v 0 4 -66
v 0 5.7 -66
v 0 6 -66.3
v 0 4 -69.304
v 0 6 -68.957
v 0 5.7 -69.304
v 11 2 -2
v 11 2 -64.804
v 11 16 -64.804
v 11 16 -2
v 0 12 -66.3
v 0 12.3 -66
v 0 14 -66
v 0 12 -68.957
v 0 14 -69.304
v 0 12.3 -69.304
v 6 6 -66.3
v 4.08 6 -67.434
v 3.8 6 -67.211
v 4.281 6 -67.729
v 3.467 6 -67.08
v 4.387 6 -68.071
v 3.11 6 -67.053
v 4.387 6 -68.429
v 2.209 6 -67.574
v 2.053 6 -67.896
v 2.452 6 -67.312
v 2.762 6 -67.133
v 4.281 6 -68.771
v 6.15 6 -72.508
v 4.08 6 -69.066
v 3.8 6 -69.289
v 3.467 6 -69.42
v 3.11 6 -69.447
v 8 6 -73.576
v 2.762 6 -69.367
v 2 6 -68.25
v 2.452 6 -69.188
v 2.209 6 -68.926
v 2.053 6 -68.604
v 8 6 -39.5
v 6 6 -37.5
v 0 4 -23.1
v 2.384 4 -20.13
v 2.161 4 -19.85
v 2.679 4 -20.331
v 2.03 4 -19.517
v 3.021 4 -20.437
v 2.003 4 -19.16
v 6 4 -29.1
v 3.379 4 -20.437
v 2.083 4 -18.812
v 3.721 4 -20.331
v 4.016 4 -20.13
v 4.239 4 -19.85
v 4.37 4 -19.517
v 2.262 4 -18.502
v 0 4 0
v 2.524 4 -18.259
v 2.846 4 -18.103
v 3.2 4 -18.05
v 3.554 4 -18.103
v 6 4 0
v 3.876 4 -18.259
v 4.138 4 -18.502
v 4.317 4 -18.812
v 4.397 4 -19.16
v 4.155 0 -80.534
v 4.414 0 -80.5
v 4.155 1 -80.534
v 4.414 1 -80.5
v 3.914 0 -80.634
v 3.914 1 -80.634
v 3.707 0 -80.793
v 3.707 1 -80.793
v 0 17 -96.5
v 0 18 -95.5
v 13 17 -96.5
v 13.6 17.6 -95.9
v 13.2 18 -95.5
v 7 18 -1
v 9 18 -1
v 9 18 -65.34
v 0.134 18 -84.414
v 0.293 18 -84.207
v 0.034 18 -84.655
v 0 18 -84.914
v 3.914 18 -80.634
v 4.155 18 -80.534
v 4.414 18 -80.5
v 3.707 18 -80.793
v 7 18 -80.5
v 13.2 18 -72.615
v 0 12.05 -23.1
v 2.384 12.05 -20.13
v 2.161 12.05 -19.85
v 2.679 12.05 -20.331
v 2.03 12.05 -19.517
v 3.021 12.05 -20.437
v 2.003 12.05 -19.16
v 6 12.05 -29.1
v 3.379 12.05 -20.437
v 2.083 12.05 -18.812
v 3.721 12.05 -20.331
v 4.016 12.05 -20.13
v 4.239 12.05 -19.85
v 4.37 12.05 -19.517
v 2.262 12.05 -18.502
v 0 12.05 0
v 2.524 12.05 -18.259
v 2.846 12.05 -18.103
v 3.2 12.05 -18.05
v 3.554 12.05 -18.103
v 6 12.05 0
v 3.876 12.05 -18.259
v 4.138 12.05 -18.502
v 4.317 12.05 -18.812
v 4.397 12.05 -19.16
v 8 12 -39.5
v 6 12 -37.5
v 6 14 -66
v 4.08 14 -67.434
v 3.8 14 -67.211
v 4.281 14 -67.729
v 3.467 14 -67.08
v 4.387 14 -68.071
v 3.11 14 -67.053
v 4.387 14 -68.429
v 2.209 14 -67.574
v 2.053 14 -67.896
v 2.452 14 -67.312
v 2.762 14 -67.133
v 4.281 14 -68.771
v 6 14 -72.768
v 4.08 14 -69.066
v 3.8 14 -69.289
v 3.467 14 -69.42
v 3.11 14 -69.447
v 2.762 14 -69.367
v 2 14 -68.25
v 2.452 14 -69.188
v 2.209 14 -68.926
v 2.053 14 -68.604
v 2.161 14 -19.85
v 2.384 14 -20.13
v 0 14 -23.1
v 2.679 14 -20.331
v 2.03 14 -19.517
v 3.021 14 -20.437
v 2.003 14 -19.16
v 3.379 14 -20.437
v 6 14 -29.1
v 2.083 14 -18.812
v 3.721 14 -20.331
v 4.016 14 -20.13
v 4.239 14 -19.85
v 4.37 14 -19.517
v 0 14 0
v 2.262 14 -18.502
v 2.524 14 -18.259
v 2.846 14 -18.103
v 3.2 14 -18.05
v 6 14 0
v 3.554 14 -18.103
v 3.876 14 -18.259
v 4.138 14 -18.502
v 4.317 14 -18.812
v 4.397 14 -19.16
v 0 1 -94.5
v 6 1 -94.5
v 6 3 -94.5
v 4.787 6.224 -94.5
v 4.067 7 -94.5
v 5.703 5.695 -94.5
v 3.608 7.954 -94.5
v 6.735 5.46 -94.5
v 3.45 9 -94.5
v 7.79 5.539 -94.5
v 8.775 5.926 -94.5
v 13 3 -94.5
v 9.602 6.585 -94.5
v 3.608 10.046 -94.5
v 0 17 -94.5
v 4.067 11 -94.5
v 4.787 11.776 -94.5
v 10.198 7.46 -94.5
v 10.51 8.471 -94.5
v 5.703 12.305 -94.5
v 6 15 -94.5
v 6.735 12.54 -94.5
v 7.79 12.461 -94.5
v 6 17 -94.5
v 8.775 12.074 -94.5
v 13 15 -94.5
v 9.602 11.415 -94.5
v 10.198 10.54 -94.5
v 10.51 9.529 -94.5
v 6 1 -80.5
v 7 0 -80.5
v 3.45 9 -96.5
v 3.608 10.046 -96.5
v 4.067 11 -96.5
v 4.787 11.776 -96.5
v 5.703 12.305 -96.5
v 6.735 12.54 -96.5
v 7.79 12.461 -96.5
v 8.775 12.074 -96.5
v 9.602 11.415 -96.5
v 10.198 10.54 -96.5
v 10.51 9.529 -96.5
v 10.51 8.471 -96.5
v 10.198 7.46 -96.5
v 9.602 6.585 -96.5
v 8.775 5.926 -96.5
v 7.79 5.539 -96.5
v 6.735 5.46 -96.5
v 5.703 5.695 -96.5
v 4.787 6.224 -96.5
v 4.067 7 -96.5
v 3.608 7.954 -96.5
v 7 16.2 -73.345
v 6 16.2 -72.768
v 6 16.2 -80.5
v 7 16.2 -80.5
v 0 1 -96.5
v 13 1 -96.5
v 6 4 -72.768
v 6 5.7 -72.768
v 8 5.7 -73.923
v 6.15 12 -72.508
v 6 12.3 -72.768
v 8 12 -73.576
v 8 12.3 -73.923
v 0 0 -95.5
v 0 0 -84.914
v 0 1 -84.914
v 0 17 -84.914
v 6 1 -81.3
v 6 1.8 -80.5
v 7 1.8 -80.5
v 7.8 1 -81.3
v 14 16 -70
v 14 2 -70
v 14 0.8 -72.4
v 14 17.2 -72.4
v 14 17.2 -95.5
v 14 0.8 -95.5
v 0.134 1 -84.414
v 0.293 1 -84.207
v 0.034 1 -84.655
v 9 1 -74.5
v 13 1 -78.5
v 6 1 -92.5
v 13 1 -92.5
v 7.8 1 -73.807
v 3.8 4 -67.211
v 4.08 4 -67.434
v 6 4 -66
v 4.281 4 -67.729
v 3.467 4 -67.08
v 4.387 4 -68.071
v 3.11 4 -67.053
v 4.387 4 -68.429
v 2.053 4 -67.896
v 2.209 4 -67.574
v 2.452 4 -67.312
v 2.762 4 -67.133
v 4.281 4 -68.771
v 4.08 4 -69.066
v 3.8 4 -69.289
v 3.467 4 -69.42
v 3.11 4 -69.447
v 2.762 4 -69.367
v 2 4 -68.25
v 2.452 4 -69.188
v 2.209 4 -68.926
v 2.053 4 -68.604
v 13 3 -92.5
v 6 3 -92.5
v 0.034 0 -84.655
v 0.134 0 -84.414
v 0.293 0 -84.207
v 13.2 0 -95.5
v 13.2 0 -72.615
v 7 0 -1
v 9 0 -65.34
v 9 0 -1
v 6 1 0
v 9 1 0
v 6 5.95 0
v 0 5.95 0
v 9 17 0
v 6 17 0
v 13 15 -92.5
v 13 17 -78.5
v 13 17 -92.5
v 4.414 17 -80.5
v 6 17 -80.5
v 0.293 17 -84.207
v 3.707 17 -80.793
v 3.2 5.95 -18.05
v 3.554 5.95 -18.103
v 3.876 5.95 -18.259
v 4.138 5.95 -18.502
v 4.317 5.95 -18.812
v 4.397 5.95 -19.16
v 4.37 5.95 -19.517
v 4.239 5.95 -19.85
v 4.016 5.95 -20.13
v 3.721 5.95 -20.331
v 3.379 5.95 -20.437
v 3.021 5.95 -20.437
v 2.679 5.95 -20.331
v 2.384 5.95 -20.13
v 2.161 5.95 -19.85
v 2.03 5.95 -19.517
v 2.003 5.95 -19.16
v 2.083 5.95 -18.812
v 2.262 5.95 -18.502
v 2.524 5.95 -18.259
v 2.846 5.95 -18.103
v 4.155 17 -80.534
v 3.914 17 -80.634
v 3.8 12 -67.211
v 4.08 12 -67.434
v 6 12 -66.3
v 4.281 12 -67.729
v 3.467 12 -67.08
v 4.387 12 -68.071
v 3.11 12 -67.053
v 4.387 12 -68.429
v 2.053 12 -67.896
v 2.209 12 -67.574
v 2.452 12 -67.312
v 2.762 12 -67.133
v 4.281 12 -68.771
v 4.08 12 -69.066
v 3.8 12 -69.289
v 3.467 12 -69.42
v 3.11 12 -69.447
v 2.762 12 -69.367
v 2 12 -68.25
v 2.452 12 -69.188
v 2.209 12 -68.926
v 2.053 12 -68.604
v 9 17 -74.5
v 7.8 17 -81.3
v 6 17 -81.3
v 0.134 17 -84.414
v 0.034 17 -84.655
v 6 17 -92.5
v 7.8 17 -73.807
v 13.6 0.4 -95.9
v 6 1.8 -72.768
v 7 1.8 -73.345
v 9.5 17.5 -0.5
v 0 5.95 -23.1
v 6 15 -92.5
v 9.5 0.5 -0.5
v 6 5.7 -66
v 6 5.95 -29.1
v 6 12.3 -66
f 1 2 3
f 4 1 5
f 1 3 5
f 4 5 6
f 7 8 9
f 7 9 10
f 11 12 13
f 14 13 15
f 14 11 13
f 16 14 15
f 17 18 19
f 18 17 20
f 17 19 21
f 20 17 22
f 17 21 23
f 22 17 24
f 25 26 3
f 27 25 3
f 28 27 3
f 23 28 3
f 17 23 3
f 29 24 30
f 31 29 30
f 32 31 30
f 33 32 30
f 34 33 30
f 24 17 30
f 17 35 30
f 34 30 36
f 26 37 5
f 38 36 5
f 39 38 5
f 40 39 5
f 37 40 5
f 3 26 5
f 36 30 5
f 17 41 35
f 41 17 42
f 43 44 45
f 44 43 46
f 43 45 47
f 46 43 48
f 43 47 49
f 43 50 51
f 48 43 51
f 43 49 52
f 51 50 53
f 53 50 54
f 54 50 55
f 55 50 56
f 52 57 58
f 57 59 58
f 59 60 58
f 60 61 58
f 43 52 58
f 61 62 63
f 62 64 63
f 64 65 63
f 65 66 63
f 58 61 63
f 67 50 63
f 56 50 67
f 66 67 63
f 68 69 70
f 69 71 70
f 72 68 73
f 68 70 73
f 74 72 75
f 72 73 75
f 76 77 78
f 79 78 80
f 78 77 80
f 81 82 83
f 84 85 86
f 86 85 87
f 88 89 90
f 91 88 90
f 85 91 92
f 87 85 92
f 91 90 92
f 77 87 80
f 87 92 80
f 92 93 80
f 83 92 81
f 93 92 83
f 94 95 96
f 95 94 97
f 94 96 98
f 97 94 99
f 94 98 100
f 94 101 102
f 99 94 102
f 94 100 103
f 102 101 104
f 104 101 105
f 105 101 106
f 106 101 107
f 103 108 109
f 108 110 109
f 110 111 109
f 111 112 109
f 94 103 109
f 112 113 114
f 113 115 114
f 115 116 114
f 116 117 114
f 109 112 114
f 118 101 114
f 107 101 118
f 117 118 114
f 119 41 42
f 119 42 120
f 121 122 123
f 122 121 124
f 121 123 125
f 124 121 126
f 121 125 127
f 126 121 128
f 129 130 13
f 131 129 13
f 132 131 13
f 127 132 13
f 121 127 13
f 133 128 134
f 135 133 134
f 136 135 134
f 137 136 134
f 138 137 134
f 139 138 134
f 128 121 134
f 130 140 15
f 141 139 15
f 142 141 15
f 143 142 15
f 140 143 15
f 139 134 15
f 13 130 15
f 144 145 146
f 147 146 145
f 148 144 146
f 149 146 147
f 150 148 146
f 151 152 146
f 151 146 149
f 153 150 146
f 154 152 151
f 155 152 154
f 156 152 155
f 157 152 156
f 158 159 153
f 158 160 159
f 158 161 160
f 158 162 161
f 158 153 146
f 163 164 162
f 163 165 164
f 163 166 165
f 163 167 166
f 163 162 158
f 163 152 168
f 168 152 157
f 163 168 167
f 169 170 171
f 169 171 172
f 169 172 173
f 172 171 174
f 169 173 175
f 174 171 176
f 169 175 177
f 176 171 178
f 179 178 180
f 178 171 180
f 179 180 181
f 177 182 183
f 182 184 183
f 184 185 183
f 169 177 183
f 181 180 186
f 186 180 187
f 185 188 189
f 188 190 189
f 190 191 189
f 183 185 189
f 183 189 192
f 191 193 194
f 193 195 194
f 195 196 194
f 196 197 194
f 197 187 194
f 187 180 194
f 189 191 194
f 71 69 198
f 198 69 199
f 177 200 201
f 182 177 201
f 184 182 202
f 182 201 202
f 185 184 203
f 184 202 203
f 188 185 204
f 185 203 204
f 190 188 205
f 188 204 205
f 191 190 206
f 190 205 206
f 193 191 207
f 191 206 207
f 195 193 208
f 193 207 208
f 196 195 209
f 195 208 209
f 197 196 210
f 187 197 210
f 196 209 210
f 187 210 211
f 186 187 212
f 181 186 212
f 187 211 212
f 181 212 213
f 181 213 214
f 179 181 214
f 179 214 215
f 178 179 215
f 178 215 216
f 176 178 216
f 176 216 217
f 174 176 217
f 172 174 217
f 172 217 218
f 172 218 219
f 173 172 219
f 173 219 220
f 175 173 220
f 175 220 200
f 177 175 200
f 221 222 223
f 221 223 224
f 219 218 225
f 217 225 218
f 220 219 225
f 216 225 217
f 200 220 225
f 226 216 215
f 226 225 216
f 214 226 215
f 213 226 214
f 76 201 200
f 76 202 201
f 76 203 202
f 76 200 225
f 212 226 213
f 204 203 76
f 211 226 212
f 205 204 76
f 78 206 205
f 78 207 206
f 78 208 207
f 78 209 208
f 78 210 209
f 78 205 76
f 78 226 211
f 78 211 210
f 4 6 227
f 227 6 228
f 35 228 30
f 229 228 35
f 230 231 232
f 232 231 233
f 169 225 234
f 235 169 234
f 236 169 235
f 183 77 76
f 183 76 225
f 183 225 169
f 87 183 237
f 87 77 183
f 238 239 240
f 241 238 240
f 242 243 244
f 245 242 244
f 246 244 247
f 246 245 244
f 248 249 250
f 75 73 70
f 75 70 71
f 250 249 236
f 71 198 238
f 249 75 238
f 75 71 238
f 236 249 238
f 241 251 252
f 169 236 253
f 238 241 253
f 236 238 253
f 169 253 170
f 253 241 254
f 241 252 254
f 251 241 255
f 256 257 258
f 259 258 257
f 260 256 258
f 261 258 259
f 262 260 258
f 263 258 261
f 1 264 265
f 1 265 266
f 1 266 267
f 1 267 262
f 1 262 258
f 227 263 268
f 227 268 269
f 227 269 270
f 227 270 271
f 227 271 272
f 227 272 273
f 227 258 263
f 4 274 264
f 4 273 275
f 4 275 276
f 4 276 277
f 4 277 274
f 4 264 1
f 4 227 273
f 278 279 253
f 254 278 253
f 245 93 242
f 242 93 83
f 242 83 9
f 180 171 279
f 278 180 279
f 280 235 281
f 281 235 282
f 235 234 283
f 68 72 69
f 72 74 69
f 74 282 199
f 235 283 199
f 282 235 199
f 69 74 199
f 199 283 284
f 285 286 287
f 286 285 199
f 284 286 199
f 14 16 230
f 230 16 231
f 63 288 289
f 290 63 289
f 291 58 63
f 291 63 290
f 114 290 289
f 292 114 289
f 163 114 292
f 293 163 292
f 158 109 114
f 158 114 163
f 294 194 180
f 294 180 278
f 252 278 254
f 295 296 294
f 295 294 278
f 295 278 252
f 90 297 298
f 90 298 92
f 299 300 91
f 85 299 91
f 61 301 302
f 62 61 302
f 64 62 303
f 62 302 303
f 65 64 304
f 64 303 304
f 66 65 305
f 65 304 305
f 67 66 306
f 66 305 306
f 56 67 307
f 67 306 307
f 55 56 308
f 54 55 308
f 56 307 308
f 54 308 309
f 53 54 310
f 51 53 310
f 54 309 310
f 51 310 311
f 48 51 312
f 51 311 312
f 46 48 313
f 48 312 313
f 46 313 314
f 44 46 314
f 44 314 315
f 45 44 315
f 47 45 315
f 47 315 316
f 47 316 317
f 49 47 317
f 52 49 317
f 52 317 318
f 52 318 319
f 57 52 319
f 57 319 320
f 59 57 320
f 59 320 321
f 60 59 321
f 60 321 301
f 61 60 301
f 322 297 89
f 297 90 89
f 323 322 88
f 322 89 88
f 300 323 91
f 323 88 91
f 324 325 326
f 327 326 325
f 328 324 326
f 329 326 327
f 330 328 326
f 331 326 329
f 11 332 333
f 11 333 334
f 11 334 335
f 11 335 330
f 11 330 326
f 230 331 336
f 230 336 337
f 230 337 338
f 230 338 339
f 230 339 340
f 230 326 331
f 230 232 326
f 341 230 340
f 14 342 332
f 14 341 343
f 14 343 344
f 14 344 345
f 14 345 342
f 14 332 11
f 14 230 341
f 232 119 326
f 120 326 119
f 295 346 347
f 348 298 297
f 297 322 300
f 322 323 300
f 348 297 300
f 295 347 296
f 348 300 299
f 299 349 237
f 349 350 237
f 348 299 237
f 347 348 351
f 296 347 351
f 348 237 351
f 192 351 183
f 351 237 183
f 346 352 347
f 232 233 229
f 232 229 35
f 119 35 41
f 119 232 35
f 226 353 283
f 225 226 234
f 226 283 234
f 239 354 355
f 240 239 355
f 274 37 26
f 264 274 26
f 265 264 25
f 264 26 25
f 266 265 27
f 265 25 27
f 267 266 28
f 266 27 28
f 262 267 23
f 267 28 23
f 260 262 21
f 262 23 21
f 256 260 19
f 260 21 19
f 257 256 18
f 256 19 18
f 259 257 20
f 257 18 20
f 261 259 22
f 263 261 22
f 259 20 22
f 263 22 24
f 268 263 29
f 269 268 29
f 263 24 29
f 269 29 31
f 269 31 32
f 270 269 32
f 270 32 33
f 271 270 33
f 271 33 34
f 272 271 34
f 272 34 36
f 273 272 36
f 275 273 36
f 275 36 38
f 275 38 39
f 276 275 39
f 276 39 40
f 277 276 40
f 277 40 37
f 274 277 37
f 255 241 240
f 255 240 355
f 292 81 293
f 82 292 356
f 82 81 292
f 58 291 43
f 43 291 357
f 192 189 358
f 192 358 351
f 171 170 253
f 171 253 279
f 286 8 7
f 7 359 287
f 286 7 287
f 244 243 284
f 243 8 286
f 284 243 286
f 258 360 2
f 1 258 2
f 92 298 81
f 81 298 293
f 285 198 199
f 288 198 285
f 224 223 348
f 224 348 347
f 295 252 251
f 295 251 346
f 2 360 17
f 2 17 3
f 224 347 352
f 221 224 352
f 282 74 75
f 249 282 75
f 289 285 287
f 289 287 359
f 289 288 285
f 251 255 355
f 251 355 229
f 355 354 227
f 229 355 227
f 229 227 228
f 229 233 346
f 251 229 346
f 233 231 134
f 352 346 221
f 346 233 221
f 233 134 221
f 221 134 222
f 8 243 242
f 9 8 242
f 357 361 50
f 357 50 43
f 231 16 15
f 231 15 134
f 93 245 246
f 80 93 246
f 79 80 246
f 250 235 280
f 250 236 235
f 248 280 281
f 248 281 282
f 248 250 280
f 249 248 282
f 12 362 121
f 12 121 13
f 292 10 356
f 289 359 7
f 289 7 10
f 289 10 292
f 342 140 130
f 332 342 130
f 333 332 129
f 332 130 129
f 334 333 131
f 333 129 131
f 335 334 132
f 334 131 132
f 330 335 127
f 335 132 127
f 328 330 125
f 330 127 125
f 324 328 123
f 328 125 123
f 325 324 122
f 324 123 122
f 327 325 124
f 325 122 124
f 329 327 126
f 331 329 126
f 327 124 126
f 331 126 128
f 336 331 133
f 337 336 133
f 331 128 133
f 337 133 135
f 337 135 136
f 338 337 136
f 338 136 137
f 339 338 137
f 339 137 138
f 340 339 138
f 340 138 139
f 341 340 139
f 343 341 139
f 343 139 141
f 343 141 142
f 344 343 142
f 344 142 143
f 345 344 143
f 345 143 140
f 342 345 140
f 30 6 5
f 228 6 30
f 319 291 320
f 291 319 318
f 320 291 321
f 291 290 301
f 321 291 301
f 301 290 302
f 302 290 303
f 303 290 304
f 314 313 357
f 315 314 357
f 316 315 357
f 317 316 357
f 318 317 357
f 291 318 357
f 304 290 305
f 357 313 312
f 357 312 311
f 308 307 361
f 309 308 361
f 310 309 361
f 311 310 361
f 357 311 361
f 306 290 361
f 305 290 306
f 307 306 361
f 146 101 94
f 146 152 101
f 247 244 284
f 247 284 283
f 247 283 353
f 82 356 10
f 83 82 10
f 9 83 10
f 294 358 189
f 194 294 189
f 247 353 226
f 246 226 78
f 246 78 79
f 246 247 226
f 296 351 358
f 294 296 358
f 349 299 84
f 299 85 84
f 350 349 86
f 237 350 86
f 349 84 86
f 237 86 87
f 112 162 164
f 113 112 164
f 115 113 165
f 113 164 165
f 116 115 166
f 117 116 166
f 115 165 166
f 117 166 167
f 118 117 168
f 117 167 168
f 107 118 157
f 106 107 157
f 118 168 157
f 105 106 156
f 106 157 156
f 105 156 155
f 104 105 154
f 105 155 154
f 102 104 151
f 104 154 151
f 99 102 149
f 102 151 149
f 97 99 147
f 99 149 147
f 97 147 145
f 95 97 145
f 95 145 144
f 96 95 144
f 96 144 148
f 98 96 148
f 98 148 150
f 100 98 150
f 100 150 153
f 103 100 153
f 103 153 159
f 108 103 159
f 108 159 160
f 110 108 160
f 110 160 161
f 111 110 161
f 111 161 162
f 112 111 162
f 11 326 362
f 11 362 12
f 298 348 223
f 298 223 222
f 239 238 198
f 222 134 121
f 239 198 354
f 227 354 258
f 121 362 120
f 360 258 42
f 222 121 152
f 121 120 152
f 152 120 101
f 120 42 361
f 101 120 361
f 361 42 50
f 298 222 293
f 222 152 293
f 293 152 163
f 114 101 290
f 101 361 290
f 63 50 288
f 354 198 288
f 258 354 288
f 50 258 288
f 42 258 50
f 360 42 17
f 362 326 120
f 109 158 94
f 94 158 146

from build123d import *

# Parameters (mm, degrees)
SKETCH_2_W           = 96.5
SKETCH_2_H           = 18
EXTRUDE_1_DEPTH      = 14
SKETCH_6_W           = 6
SKETCH_6_H           = 4
CUT_EXTRUDE_3_DEPTH  = 100.157702676
CUT_EXTRUDE_START    = -4
SKETCH_6_4_W         = 6
SKETCH_6_4_H         = 6.1
CUT_EXTRUDE_5_DEPTH  = 96.157702676
SKETCH_7_W           = 73.4
SKETCH_7_H           = 10
CUT_EXTRUDE_4_DEPTH  = 6
SKETCH_8_R           = 1.2
CUT_EXTRUDE_6_DEPTH  = 99.510151761
SKETCH_10_W          = 2
SKETCH_10_H          = 18
EXTRUDE_3_DEPTH      = 6
CUT_EXTRUDE_7_DEPTH  = 7
CHAMFER_4_SIZE       = 1
SKETCH_12_R          = 3.55
CUT_EXTRUDE_8_DEPTH  = 5
CHAMFER_6_SIZE       = 0.8
CHAMFER_7_SIZE       = 1
EXTRUDE_4_REACH      = 106.158
EXTRUDE_START        = -5
SKETCH_13_W          = 14
SKETCH_13_H          = 1
CHAMFER_8_SIZE       = 6
CHAMFER_9_SIZE       = 4
CHAMFER_10_SIZE      = 3
CHAMFER_10_SIZE2     = 1.732050808
SKETCH_14_W          = 35
SKETCH_14_H          = 6
CUT_EXTRUDE_9_DEPTH  = 2
CHAMFER_11_SIZE      = 4
SKETCH_15_W          = 3
SKETCH_15_H          = 70
CUT_EXTRUDE_10_DEPTH = 100.157702676
CHAMFER_12_SIZE2     = 3
CHAMFER_12_SIZE      = 5.196152423
CHAMFER_14_SIZE      = 2
SKETCH_16_W          = 1
SKETCH_16_H          = 12
EXTRUDE_5_DEPTH      = 0.8
EXTRUDE_START_2      = 16
SKETCH_16_2_W        = 1
SKETCH_16_2_H        = 12
EXTRUDE_6_DEPTH      = 0.8
CHAMFER_15_SIZE      = 0.8
FILLET_1_R           = 1
EXTRUDE_7_DEPTH      = 2
EXTRUDE_START_3      = 6
EXTRUDE_8_DEPTH      = 2
SKETCH_18_R          = 1.2
CUT_EXTRUDE_11_DEPTH = 99.510151761
CHAMFER_16_SIZE      = 0.3


# Some blends are built 0.0001 mm under size
with BuildPart() as part:
    # 草图2 → 凸台-拉伸1 (new body)
    with BuildSketch(Plane(origin=(0, 0, 0), x_dir=(0, 0, -1), z_dir=(1, 0, 0))):
        with Locations((48.25, 9)):
            Rectangle(SKETCH_2_W, SKETCH_2_H)
    extrude(amount=EXTRUDE_1_DEPTH)

    # 草图6 → 切除-拉伸3 (cut, through all)
    with BuildSketch(Plane(origin=(0, 0, -96.5), x_dir=(-1, 0, 0), z_dir=(0, 0, -1))):
        with Locations((-3, 16)):
            Rectangle(SKETCH_6_W, SKETCH_6_H)
        with Locations((-3, 2)):
            Rectangle(SKETCH_6_W, SKETCH_6_H)
    extrude(amount=-CUT_EXTRUDE_3_DEPTH, mode=Mode.SUBTRACT)

    # 草图6<4> → 切除-拉伸5 (cut, through all)
    with BuildSketch(Plane(origin=(0, 0, -96.5), x_dir=(-1, 0, 0), z_dir=(0, 0, -1)).offset(CUT_EXTRUDE_START)):
        with Locations((-3, 9)):
            Rectangle(SKETCH_6_4_W, SKETCH_6_4_H)
    extrude(amount=-CUT_EXTRUDE_5_DEPTH, mode=Mode.SUBTRACT)

    # 草图7 → 切除-拉伸4 (cut)
    with BuildSketch(Plane.ZY):
        with Locations((-59.8, 9)):
            Rectangle(SKETCH_7_W, SKETCH_7_H)
    extrude(amount=-CUT_EXTRUDE_4_DEPTH, mode=Mode.SUBTRACT)

    # 草图8 → 切除-拉伸6 (cut, through all)
    with BuildSketch(Plane(origin=(0, 14, 0), x_dir=(1, 0, 0), z_dir=(0, 1, 0))):
        with Locations(Location((3.2, 19.25, 0), (0, 0, 270))):
            Circle(SKETCH_8_R)
    extrude(amount=-CUT_EXTRUDE_6_DEPTH, mode=Mode.SUBTRACT)

    # 草图10 → 凸台-拉伸3 (add)
    with BuildSketch(Plane.ZY.offset(-6)):
        with Locations((-95.5, 9)):
            Rectangle(SKETCH_10_W, SKETCH_10_H)
    extrude(amount=EXTRUDE_3_DEPTH)

    # 草图11 → 切除-拉伸7 (cut)
    with BuildSketch(Plane.ZY.offset(-6)):
        Polygon((-94.5, 3), (-92.5, 3), (-92.5, 1), (-74.5, 1), (-74.5, 17), (-92.5, 17), (-92.5, 15), (-94.5, 15), align=None)
    extrude(amount=-CUT_EXTRUDE_7_DEPTH, mode=Mode.SUBTRACT)

    # 倒角4
    chamfer_4_edges = [part.edges().sort_by_distance(p)[0] for p in [
        (14, 9, -96.5),
        (6, 18, -47.25),
        (6, 0, -47.25),
        (7, 18, -96.5),
        (7, 0, -96.5),
    ]]
    chamfer(chamfer_4_edges, length=CHAMFER_4_SIZE - 0.0001)  # a hair under: the kernel refuses the full size

    # 草图12 → 切除-拉伸8 (cut)
    with BuildSketch(Plane(origin=(0, 0, -96.5), x_dir=(-1, 0, 0), z_dir=(0, 0, -1))):
        with Locations((-7, 9)):
            Circle(SKETCH_12_R)
    extrude(amount=-CUT_EXTRUDE_8_DEPTH, mode=Mode.SUBTRACT)

    # 倒角6
    chamfer_6_edges = [part.edges().sort_by_distance(p)[0] for p in [
        (14, 18, -47.75005),
        (14, 0, -47.75005),
    ]]
    chamfer(chamfer_6_edges, length=CHAMFER_6_SIZE)

    # 倒角7
    chamfer_7_edges = [part.edges().sort_by_distance(p)[0] for p in [
        (10.09995, 0, 0),
        (10.09995, 18, 0),
    ]]
    chamfer(chamfer_7_edges, length=CHAMFER_7_SIZE)

    # 凸台-拉伸4: up to this face of the body (flat: up to its plane)
    extrude_4_end = Plane(part.part.faces().sort_by_distance((0, 9, -95.480955347))[0])
    # 草图13 → 凸台-拉伸4 (add, up to the picked face)
    with BuildSketch(Plane(origin=(14, 0, 0), x_dir=(0, 0, -1), z_dir=(1, 0, 0)).offset(EXTRUDE_START), mode=Mode.PRIVATE) as extrude_4_sk1:
        with Locations((87.5, 0.5)):
            Rectangle(SKETCH_13_W, SKETCH_13_H)
    extrude_4_tool1 = split(extrude(extrude_4_sk1.sketch, amount=-EXTRUDE_4_REACH, mode=Mode.PRIVATE), bisect_by=extrude_4_end, keep=Keep.BOTH, mode=Mode.PRIVATE)
    # 草图13 → 凸台-拉伸4 (add, up to the picked face)
    with BuildSketch(Plane(origin=(14, 0, 0), x_dir=(0, 0, -1), z_dir=(1, 0, 0)).offset(EXTRUDE_START), mode=Mode.PRIVATE) as extrude_4_sk2:
        with Locations((87.5, 17.5)):
            Rectangle(SKETCH_13_W, SKETCH_13_H)
    extrude_4_tool2 = split(extrude(extrude_4_sk2.sketch, amount=-EXTRUDE_4_REACH, mode=Mode.PRIVATE), bisect_by=extrude_4_end, keep=Keep.BOTH, mode=Mode.PRIVATE)
    add(extrude_4_tool1.solids().sort_by(Axis((9, 0.5, -87.5), (-1, 0, 0)))[0])
    add(extrude_4_tool2.solids().sort_by(Axis((9, 17.5, -87.5), (-1, 0, 0)))[0])

    # 倒角8
    # the kernel refuses this chamfer: 6 mm, written as the material it adds along each edge
    with BuildSketch(Plane(origin=(6, 14, -23.1), x_dir=(0.027495876610585775, 0, -0.9996219169112968), z_dir=(0, -1, 0))) as chamfer_8_piece_1_section:
        Polygon((CHAMFER_8_SIZE * 0.999621916911, -CHAMFER_8_SIZE * 0.0274958766106), (-CHAMFER_8_SIZE * 0.0274958766106, -CHAMFER_8_SIZE * 0.999621916911), (0, 0), align=None)
    chamfer_8_piece_1 = extrude(amount=1.95, mode=Mode.PRIVATE)
    chamfer_8_piece_1 = split(chamfer_8_piece_1, bisect_by=Plane(origin=(1.869207623, 12.869307623, -23.733347392), z_dir=(-0.7071067811865476, 0.7071067811865476, 0)), keep=Keep.TOP, mode=Mode.PRIVATE)
    chamfer_8_piece_1 = split(chamfer_8_piece_1, bisect_by=Plane(origin=(0, 13.288222987, -23.733347392), z_dir=(1, 0, 0)), keep=Keep.TOP, mode=Mode.PRIVATE)
    add(chamfer_8_piece_1)
    with BuildSketch(Plane(origin=(6, 14, -23.1), x_dir=(0.027495876610585775, 0, -0.9996219169112968), z_dir=(0, -1, 0))) as chamfer_8_piece_2_section:
        Polygon((CHAMFER_8_SIZE * 0.999621916911, -CHAMFER_8_SIZE * 0.0274958766106), (-CHAMFER_8_SIZE * 0.0274958766106, -CHAMFER_8_SIZE * 0.999621916911), (0, 0), align=None)
    chamfer_8_piece_2 = extrude(amount=1.95, mode=Mode.PRIVATE)
    chamfer_8_piece_2 = split(chamfer_8_piece_2, bisect_by=Plane(origin=(3.203468607, 14.203568607, -25.288657403), z_dir=(0.7071067811865476, -0.7071067811865476, 0)), keep=Keep.TOP, mode=Mode.PRIVATE)
    add(chamfer_8_piece_2)
    with BuildSketch(Plane(origin=(6, 14, -23.1), x_dir=(0.027495876610585775, 0, -0.9996219169112968), z_dir=(0, -1, 0))) as chamfer_8_piece_3_section:
        Polygon((CHAMFER_8_SIZE * 0.999621916911, -CHAMFER_8_SIZE * 0.0274958766106), (-CHAMFER_8_SIZE * 0.0274958766106, -CHAMFER_8_SIZE * 0.999621916911), (0, 0), align=None)
    chamfer_8_piece_3 = extrude(amount=17.380097928, mode=Mode.PRIVATE)
    chamfer_8_piece_3 = split(chamfer_8_piece_3, bisect_by=Plane(origin=(3.203468607, 3.796431393, -25.288657403), z_dir=(0.7071067811865475, 0.7071067811865476, 0)), keep=Keep.TOP, mode=Mode.PRIVATE)
    chamfer_8_piece_3 = split(chamfer_8_piece_3, bisect_by=Plane(origin=(4.422275915, 5.95, -25.288657403), z_dir=(0, -1, 0)), keep=Keep.TOP, mode=Mode.PRIVATE)
    chamfer_8_piece_3 = split(chamfer_8_piece_3, bisect_by=Plane(origin=(4.422275915, 4, -25.288657403), z_dir=(0, 1, 0)), keep=Keep.TOP, mode=Mode.PRIVATE)
    add(chamfer_8_piece_3)
    with BuildSketch(Plane(origin=(6, 14, -23.1), x_dir=(0.027495876610585775, 0, -0.9996219169112968), z_dir=(0, -1, 0))) as chamfer_8_piece_4_section:
        Polygon((CHAMFER_8_SIZE * 0.999621916911, -CHAMFER_8_SIZE * 0.0274958766106), (-CHAMFER_8_SIZE * 0.0274958766106, -CHAMFER_8_SIZE * 0.999621916911), (0, 0), align=None)
    chamfer_8_piece_4 = extrude(amount=17.380097928, mode=Mode.PRIVATE)
    chamfer_8_piece_4 = split(chamfer_8_piece_4, bisect_by=Plane(origin=(1.869207623, 5.130692377, -23.733347392), z_dir=(-0.7071067811865475, -0.7071067811865476, 0)), keep=Keep.TOP, mode=Mode.PRIVATE)
    chamfer_8_piece_4 = split(chamfer_8_piece_4, bisect_by=Plane(origin=(0, 4.711777013, -23.733347392), z_dir=(1, 0, 0)), keep=Keep.TOP, mode=Mode.PRIVATE)
    chamfer_8_piece_4 = split(chamfer_8_piece_4, bisect_by=Plane(origin=(1.450292259, 5.95, -23.733347392), z_dir=(0, -1, 0)), keep=Keep.TOP, mode=Mode.PRIVATE)
    chamfer_8_piece_4 = split(chamfer_8_piece_4, bisect_by=Plane(origin=(1.450292259, 4, -23.733347392), z_dir=(0, 1, 0)), keep=Keep.TOP, mode=Mode.PRIVATE)
    add(chamfer_8_piece_4)
    with BuildSketch(Plane(origin=(6, 21.380097928, -23.1), x_dir=(0.02749587661058635, 0, -0.9996219169112968), z_dir=(0, -1, 0))) as chamfer_8_piece_5_section:
        Polygon((CHAMFER_8_SIZE * 0.999621916911, -CHAMFER_8_SIZE * 0.0274958766106), (-CHAMFER_8_SIZE * 0.0274958766106, -CHAMFER_8_SIZE * 0.999621916911), (0, 0), align=None)
    chamfer_8_piece_5 = extrude(amount=17.380097928, mode=Mode.PRIVATE)
    chamfer_8_piece_5 = split(chamfer_8_piece_5, bisect_by=Plane(origin=(1.869207623, 12.869307623, -23.733347392), z_dir=(-0.7071067811865476, 0.7071067811865476, 0)), keep=Keep.TOP, mode=Mode.PRIVATE)
    chamfer_8_piece_5 = split(chamfer_8_piece_5, bisect_by=Plane(origin=(1.450292259, 14, -23.733347392), z_dir=(0, -1, 0)), keep=Keep.TOP, mode=Mode.PRIVATE)
    chamfer_8_piece_5 = split(chamfer_8_piece_5, bisect_by=Plane(origin=(0, 13.288222987, -23.733347392), z_dir=(1, 0, 0)), keep=Keep.TOP, mode=Mode.PRIVATE)
    chamfer_8_piece_5 = split(chamfer_8_piece_5, bisect_by=Plane(origin=(1.450292259, 12.05, -23.733347392), z_dir=(0, 1, 0)), keep=Keep.TOP, mode=Mode.PRIVATE)
    add(chamfer_8_piece_5)
    with BuildSketch(Plane(origin=(6, 21.380097928, -23.1), x_dir=(0.02749587661058635, 0, -0.9996219169112968), z_dir=(0, -1, 0))) as chamfer_8_piece_6_section:
        Polygon((CHAMFER_8_SIZE * 0.999621916911, -CHAMFER_8_SIZE * 0.0274958766106), (-CHAMFER_8_SIZE * 0.0274958766106, -CHAMFER_8_SIZE * 0.999621916911), (0, 0), align=None)
    chamfer_8_piece_6 = extrude(amount=17.380097928, mode=Mode.PRIVATE)
    chamfer_8_piece_6 = split(chamfer_8_piece_6, bisect_by=Plane(origin=(3.203468607, 14.203568607, -25.288657403), z_dir=(0.7071067811865476, -0.7071067811865476, 0)), keep=Keep.TOP, mode=Mode.PRIVATE)
    chamfer_8_piece_6 = split(chamfer_8_piece_6, bisect_by=Plane(origin=(4.422275915, 14, -25.288657403), z_dir=(0, -1, 0)), keep=Keep.TOP, mode=Mode.PRIVATE)
    chamfer_8_piece_6 = split(chamfer_8_piece_6, bisect_by=Plane(origin=(4.422275915, 12.05, -25.288657403), z_dir=(0, 1, 0)), keep=Keep.TOP, mode=Mode.PRIVATE)
    add(chamfer_8_piece_6)
    with BuildSketch(Plane(origin=(6, 5.95, -23.1), x_dir=(0.027495876610586095, 0, -0.9996219169112968), z_dir=(0, -1, 0))) as chamfer_8_piece_7_section:
        Polygon((CHAMFER_8_SIZE * 0.999621916911, -CHAMFER_8_SIZE * 0.0274958766106), (-CHAMFER_8_SIZE * 0.0274958766106, -CHAMFER_8_SIZE * 0.999621916911), (0, 0), align=None)
    chamfer_8_piece_7 = extrude(amount=1.95, mode=Mode.PRIVATE)
    chamfer_8_piece_7 = split(chamfer_8_piece_7, bisect_by=Plane(origin=(3.203468607, 3.796431393, -25.288657403), z_dir=(0.7071067811865475, 0.7071067811865476, 0)), keep=Keep.TOP, mode=Mode.PRIVATE)
    add(chamfer_8_piece_7)
    with BuildSketch(Plane(origin=(6, 5.95, -23.1), x_dir=(0.027495876610586095, 0, -0.9996219169112968), z_dir=(0, -1, 0))) as chamfer_8_piece_8_section:
        Polygon((CHAMFER_8_SIZE * 0.999621916911, -CHAMFER_8_SIZE * 0.0274958766106), (-CHAMFER_8_SIZE * 0.0274958766106, -CHAMFER_8_SIZE * 0.999621916911), (0, 0), align=None)
    chamfer_8_piece_8 = extrude(amount=1.95, mode=Mode.PRIVATE)
    chamfer_8_piece_8 = split(chamfer_8_piece_8, bisect_by=Plane(origin=(1.869207623, 5.130692377, -23.733347392), z_dir=(-0.7071067811865475, -0.7071067811865476, 0)), keep=Keep.TOP, mode=Mode.PRIVATE)
    chamfer_8_piece_8 = split(chamfer_8_piece_8, bisect_by=Plane(origin=(0, 4.711777013, -23.733347392), z_dir=(1, 0, 0)), keep=Keep.TOP, mode=Mode.PRIVATE)
    add(chamfer_8_piece_8)

    # 倒角9
    chamfer_9_edges = [part.edges().sort_by_distance(p)[0] for p in [
        (0, 0.5, -80.5),
        (0, 17.5, -80.5),
    ]]
    chamfer(chamfer_9_edges, length=CHAMFER_9_SIZE)

    # 倒角10
    chamfer_10_edges = [part.edges().sort_by_distance(p)[0] for p in [
        (6, 9, -74.5),
    ]]
    chamfer_10_side = [part.faces().sort_by_distance(p)[0] for p in [
        (9.5, 9, -74.5),
    ]]
    chamfer(chamfer_10_edges, length=CHAMFER_10_SIZE, length2=CHAMFER_10_SIZE2, reference=chamfer_10_side[0])

    # 草图14 → 切除-拉伸9 (cut)
    with BuildSketch(Plane.ZY.offset(-6)):
        with Locations((-57, 9)):
            Rectangle(SKETCH_14_W, SKETCH_14_H)
    extrude(amount=-CUT_EXTRUDE_9_DEPTH, mode=Mode.SUBTRACT)

    # 倒角11
    chamfer_11_edges = [part.edges().sort_by_distance(p)[0] for p in [
        (13, 9, -74.5),
    ]]
    chamfer(chamfer_11_edges, length=CHAMFER_11_SIZE - 0.0001)  # a hair under: the kernel refuses the full size

    # 草图15 → 切除-拉伸10 (cut, through all)
    with BuildSketch(Plane.XZ):
        with Locations((12.5, -35)):
            Rectangle(SKETCH_15_W, SKETCH_15_H)
    extrude(amount=-CUT_EXTRUDE_10_DEPTH, mode=Mode.SUBTRACT)

    # 倒角12
    chamfer_12_edges = [part.edges().sort_by_distance(p)[0] for p in [
        (11, 9, -70),
    ]]
    chamfer_12_side = [part.faces().sort_by_distance(p)[0] for p in [
        (11, 9, -69.94),
    ]]
    chamfer(chamfer_12_edges, length=CHAMFER_12_SIZE - 0.0001, length2=CHAMFER_12_SIZE2 - 0.0001, reference=chamfer_12_side[0])  # a hair under: the kernel refuses the full size

    # 倒角13
    # the kernel refuses this chamfer: 2 mm, written as the material it takes off along each edge
    with BuildSketch(Plane(origin=(11, 18, 4.143365976), x_dir=(-0.9996219169112968, 0.027495876610585623, 0), z_dir=(0, 0, -1))) as chamfer_13_piece_1_section:
        with BuildLine():
            Line((2.05734639, 0), (-0.11309431, -2.054235587))
            Line((-0.11309431, -2.054235587), (-0.153079186, -2.053135752))
            ThreePointArc((-0.153079186, -2.053135752), (-0.068258454, -1.026795659), (-0.039984877, 0.001099835))
            Line((-0.039984877, 0.001099835), (0.001099835, 0.039984877))
            ThreePointArc((0.001099835, 0.039984877), (1.028995329, 0.011711299), (2.058446225, 0.039984877))
            Line((2.058446225, 0.039984877), (2.05734639, 0))
        make_face()
    chamfer_13_piece_1 = extrude(amount=74.090679529, mode=Mode.PRIVATE)
    chamfer_13_piece_1 = split(chamfer_13_piece_1, bisect_by=Plane(origin=(-4.335610986, 17.336943865, -38.241515955), z_dir=(0.866028454061691, 0, 0.4999947167276046)), keep=Keep.TOP, mode=Mode.PRIVATE)
    add(chamfer_13_piece_1, mode=Mode.SUBTRACT)
    with BuildSketch(Plane(origin=(11, -4.143365976, 0), x_dir=(0.027495876610586494, 0, -0.9996219169112968), z_dir=(0, 1, 0))) as chamfer_13_piece_2:
        with BuildLine():
            Line((2.05734639, 0), (-0.11309431, 2.054235587))
            Line((-0.11309431, 2.054235587), (-0.153079186, 2.053135752))
            ThreePointArc((-0.153079186, 2.053135752), (-0.068258454, 1.026795659), (-0.039984877, -0.001099835))
            Line((-0.039984877, -0.001099835), (0.001099835, -0.039984877))
            ThreePointArc((0.001099835, -0.039984877), (1.028995329, -0.011711299), (2.058446225, -0.039984877))
            Line((2.058446225, -0.039984877), (2.05734639, 0))
        make_face()
    extrude(amount=26.286731952, mode=Mode.SUBTRACT)
    with BuildSketch(Plane(origin=(11, 0, 4.143365976), x_dir=(0.027495876610586494, 0.9996219169112968, 0), z_dir=(0, 0, -1))) as chamfer_13_piece_3_section:
        with BuildLine():
            Line((2.05734639, 0), (-0.11309431, -2.054235587))
            Line((-0.11309431, -2.054235587), (-0.153079186, -2.053135752))
            ThreePointArc((-0.153079186, -2.053135752), (-0.068258454, -1.026795659), (-0.039984877, 0.001099835))
            Line((-0.039984877, 0.001099835), (0.001099835, 0.039984877))
            ThreePointArc((0.001099835, 0.039984877), (1.028995329, 0.011711299), (2.058446225, 0.039984877))
            Line((2.058446225, 0.039984877), (2.05734639, 0))
        make_face()
    chamfer_13_piece_3 = extrude(amount=74.090679529, mode=Mode.PRIVATE)
    chamfer_13_piece_3 = split(chamfer_13_piece_3, bisect_by=Plane(origin=(-4.335610986, 0.663056135, -38.241515955), z_dir=(0.866028454061691, 0, 0.4999947167276046)), keep=Keep.TOP, mode=Mode.PRIVATE)
    add(chamfer_13_piece_3, mode=Mode.SUBTRACT)
    with BuildSketch(Plane(origin=(8.428344186, 0, -60.349646292), x_dir=(0.023812211514136525, 0.9996219169112968, 0.013747793037086956), z_dir=(0.4999947167276046, 0, -0.866028454061691))) as chamfer_13_piece_4_section:
        with BuildLine():
            Line((2.05734639, 0), (-0.11309431, -2.054235587))
            Line((-0.11309431, -2.054235587), (-0.153079186, -2.053135752))
            ThreePointArc((-0.153079186, -2.053135752), (-0.068258454, -1.026795659), (-0.039984877, 0.001099835))
            Line((-0.039984877, 0.001099835), (0.001099835, 0.039984877))
            ThreePointArc((0.001099835, 0.039984877), (1.028995329, 0.011711299), (2.058446225, 0.039984877))
            Line((2.058446225, 0.039984877), (2.05734639, 0))
        make_face()
    chamfer_13_piece_4 = extrude(amount=14.686778445, mode=Mode.PRIVATE)
    chamfer_13_piece_4 = split(chamfer_13_piece_4, bisect_by=Plane(origin=(11, 0.729642002, -67.930526251), z_dir=(1, 0, 0)), keep=Keep.TOP, mode=Mode.PRIVATE)
    add(chamfer_13_piece_4, mode=Mode.SUBTRACT)
    with BuildSketch(Plane(origin=(8.428344186, 18, -60.349646292), x_dir=(-0.8657010233488743, 0.027495876610585605, -0.4998056771807688), z_dir=(0.4999947167276046, 0, -0.866028454061691))) as chamfer_13_piece_5_section:
        with BuildLine():
            Line((2.05734639, 0), (-0.11309431, -2.054235587))
            Line((-0.11309431, -2.054235587), (-0.153079186, -2.053135752))
            ThreePointArc((-0.153079186, -2.053135752), (-0.068258454, -1.026795659), (-0.039984877, 0.001099835))
            Line((-0.039984877, 0.001099835), (0.001099835, 0.039984877))
            ThreePointArc((0.001099835, 0.039984877), (1.028995329, 0.011711299), (2.058446225, 0.039984877))
            Line((2.058446225, 0.039984877), (2.05734639, 0))
        make_face()
    chamfer_13_piece_5 = extrude(amount=14.686778445, mode=Mode.PRIVATE)
    chamfer_13_piece_5 = split(chamfer_13_piece_5, bisect_by=Plane(origin=(11, 17.270357998, -67.930526251), z_dir=(1, 0, 0)), keep=Keep.TOP, mode=Mode.PRIVATE)
    add(chamfer_13_piece_5, mode=Mode.SUBTRACT)
    with BuildSketch(Plane(origin=(11, 18, 4.143365976), x_dir=(-0.9996219169112968, 0.027495876610585623, 0), z_dir=(0, 0, -1))) as chamfer_13_piece_6a_section:
        with BuildLine():
            Line((2.05734639, 0), (-0.11309431, -2.054235587))
            Line((-0.11309431, -2.054235587), (-0.153079186, -2.053135752))
            ThreePointArc((-0.153079186, -2.053135752), (-0.068258454, -1.026795659), (-0.039984877, 0.001099835))
            Line((-0.039984877, 0.001099835), (0.001099835, 0.039984877))
            ThreePointArc((0.001099835, 0.039984877), (1.028995329, 0.011711299), (2.058446225, 0.039984877))
            Line((2.058446225, 0.039984877), (2.05734639, 0))
        make_face()
    chamfer_13_piece_6a = extrude(amount=74.090679529, mode=Mode.PRIVATE)
    chamfer_13_piece_6a = split(chamfer_13_piece_6a, bisect_by=Plane(origin=(11.657577697, 17.377831414, -65.942921604), z_dir=(-0.866028454061691, 0, -0.4999947167276046)), keep=Keep.TOP, mode=Mode.PRIVATE)
    with BuildSketch(Plane(origin=(8.428344186, 18, -60.349646292), x_dir=(-0.8657010233488743, 0.027495876610585605, -0.4998056771807688), z_dir=(0.4999947167276046, 0, -0.866028454061691))) as chamfer_13_piece_6b_section:
        with BuildLine():
            Line((2.05734639, 0), (-0.11309431, -2.054235587))
            Line((-0.11309431, -2.054235587), (-0.153079186, -2.053135752))
            ThreePointArc((-0.153079186, -2.053135752), (-0.068258454, -1.026795659), (-0.039984877, 0.001099835))
            Line((-0.039984877, 0.001099835), (0.001099835, 0.039984877))
            ThreePointArc((0.001099835, 0.039984877), (1.028995329, 0.011711299), (2.058446225, 0.039984877))
            Line((2.058446225, 0.039984877), (2.05734639, 0))
        make_face()
    chamfer_13_piece_6b = extrude(amount=14.686778445, mode=Mode.PRIVATE)
    chamfer_13_piece_6b = split(chamfer_13_piece_6b, bisect_by=Plane(origin=(11, 17.377831414, -63.488778287), z_dir=(-1, 0, 0)), keep=Keep.TOP, mode=Mode.PRIVATE)
    chamfer_13_piece_6 = chamfer_13_piece_6a & chamfer_13_piece_6b
    add(chamfer_13_piece_6, mode=Mode.SUBTRACT)
    with BuildSketch(Plane(origin=(11, 0, 4.143365976), x_dir=(0.027495876610586494, 0.9996219169112968, 0), z_dir=(0, 0, -1))) as chamfer_13_piece_7a_section:
        with BuildLine():
            Line((2.05734639, 0), (-0.11309431, -2.054235587))
            Line((-0.11309431, -2.054235587), (-0.153079186, -2.053135752))
            ThreePointArc((-0.153079186, -2.053135752), (-0.068258454, -1.026795659), (-0.039984877, 0.001099835))
            Line((-0.039984877, 0.001099835), (0.001099835, 0.039984877))
            ThreePointArc((0.001099835, 0.039984877), (1.028995329, 0.011711299), (2.058446225, 0.039984877))
            Line((2.058446225, 0.039984877), (2.05734639, 0))
        make_face()
    chamfer_13_piece_7a = extrude(amount=74.090679529, mode=Mode.PRIVATE)
    chamfer_13_piece_7a = split(chamfer_13_piece_7a, bisect_by=Plane(origin=(11.657577697, 0.622168586, -65.942921604), z_dir=(-0.866028454061691, 0, -0.4999947167276046)), keep=Keep.TOP, mode=Mode.PRIVATE)
    with BuildSketch(Plane(origin=(8.428344186, 0, -60.349646292), x_dir=(0.023812211514136525, 0.9996219169112968, 0.013747793037086956), z_dir=(0.4999947167276046, 0, -0.866028454061691))) as chamfer_13_piece_7b_section:
        with BuildLine():
            Line((2.05734639, 0), (-0.11309431, -2.054235587))
            Line((-0.11309431, -2.054235587), (-0.153079186, -2.053135752))
            ThreePointArc((-0.153079186, -2.053135752), (-0.068258454, -1.026795659), (-0.039984877, 0.001099835))
            Line((-0.039984877, 0.001099835), (0.001099835, 0.039984877))
            ThreePointArc((0.001099835, 0.039984877), (1.028995329, 0.011711299), (2.058446225, 0.039984877))
            Line((2.058446225, 0.039984877), (2.05734639, 0))
        make_face()
    chamfer_13_piece_7b = extrude(amount=14.686778445, mode=Mode.PRIVATE)
    chamfer_13_piece_7b = split(chamfer_13_piece_7b, bisect_by=Plane(origin=(11, 0.622168586, -63.488778287), z_dir=(-1, 0, 0)), keep=Keep.TOP, mode=Mode.PRIVATE)
    chamfer_13_piece_7 = chamfer_13_piece_7a & chamfer_13_piece_7b
    add(chamfer_13_piece_7, mode=Mode.SUBTRACT)

    # 倒角14
    chamfer_14_edges = [part.edges().sort_by_distance(p)[0] for p in [
        (6, 9, -39.5),
    ]]
    chamfer(chamfer_14_edges, length=CHAMFER_14_SIZE - 0.0001)  # a hair under: the kernel refuses the full size

    # 草图16 → 凸台-拉伸5 (add)
    with BuildSketch(Plane.XZ.offset(-17)):
        with Locations((6.5, -74.5)):
            Rectangle(SKETCH_16_W, SKETCH_16_H)
    extrude(amount=EXTRUDE_5_DEPTH)

    # 草图16<2> → 凸台-拉伸6 (add)
    with BuildSketch(Plane.XZ.offset(-17).offset(EXTRUDE_START_2)):
        with Locations((6.5, -74.5)):
            Rectangle(SKETCH_16_2_W, SKETCH_16_2_H)
    extrude(amount=-EXTRUDE_6_DEPTH)

    # 倒角15
    chamfer_15_edges = [part.edges().sort_by_distance(p)[0] for p in [
        (7, 17, -76.922649731),
        (6.5, 17, -80.5),
        (6.5, 1, -80.5),
        (7, 1, -76.922649731),
    ]]
    chamfer(chamfer_15_edges, length=CHAMFER_15_SIZE - 0.0001)  # a hair under: the kernel refuses the full size

    # 圆角1
    fillet_1_edges = [part.edges().sort_by_distance(p)[0] for p in [
        (0, 0.5, -84.5),
        (0, 17.5, -84.5),
        (4, 17.5, -80.5),
        (4, 0.5, -80.5),
    ]]
    fillet(fillet_1_edges, radius=FILLET_1_R)

    # 草图17 → 凸台-拉伸7 (add)
    with BuildSketch(Plane(origin=(0, 6, 0), x_dir=(1, 0, 0), z_dir=(0, 1, 0))):
        Polygon((6, 72.767949192), (6, 66), (0, 66), (0, 69.303847577), align=None)
    extrude(amount=-EXTRUDE_7_DEPTH)

    # 草图17<2> → 凸台-拉伸8 (add)
    with BuildSketch(Plane(origin=(0, 6, 0), x_dir=(1, 0, 0), z_dir=(0, 1, 0)).offset(EXTRUDE_START_3)):
        Polygon((6, 72.767949192), (6, 66), (0, 66), (0, 69.303847577), align=None)
    extrude(amount=EXTRUDE_8_DEPTH)

    # 草图18 → 切除-拉伸11 (cut, through all)
    with BuildSketch(Plane(origin=(0, 14, 0), x_dir=(1, 0, 0), z_dir=(0, 1, 0))):
        with Locations(Location((3.2, 68.25, 0), (0, 0, 180))):
            Circle(SKETCH_18_R)
    extrude(amount=-CUT_EXTRUDE_11_DEPTH, mode=Mode.SUBTRACT)

    # 倒角16
    chamfer_16_edges = [part.edges().sort_by_distance(p)[0] for p in [
        (4, 6, -71.613248654),
        (4, 12, -71.613248654),
        (3, 6, -66),
        (3, 12, -66),
    ]]
    chamfer(chamfer_16_edges, length=CHAMFER_16_SIZE)


solid = part.part
